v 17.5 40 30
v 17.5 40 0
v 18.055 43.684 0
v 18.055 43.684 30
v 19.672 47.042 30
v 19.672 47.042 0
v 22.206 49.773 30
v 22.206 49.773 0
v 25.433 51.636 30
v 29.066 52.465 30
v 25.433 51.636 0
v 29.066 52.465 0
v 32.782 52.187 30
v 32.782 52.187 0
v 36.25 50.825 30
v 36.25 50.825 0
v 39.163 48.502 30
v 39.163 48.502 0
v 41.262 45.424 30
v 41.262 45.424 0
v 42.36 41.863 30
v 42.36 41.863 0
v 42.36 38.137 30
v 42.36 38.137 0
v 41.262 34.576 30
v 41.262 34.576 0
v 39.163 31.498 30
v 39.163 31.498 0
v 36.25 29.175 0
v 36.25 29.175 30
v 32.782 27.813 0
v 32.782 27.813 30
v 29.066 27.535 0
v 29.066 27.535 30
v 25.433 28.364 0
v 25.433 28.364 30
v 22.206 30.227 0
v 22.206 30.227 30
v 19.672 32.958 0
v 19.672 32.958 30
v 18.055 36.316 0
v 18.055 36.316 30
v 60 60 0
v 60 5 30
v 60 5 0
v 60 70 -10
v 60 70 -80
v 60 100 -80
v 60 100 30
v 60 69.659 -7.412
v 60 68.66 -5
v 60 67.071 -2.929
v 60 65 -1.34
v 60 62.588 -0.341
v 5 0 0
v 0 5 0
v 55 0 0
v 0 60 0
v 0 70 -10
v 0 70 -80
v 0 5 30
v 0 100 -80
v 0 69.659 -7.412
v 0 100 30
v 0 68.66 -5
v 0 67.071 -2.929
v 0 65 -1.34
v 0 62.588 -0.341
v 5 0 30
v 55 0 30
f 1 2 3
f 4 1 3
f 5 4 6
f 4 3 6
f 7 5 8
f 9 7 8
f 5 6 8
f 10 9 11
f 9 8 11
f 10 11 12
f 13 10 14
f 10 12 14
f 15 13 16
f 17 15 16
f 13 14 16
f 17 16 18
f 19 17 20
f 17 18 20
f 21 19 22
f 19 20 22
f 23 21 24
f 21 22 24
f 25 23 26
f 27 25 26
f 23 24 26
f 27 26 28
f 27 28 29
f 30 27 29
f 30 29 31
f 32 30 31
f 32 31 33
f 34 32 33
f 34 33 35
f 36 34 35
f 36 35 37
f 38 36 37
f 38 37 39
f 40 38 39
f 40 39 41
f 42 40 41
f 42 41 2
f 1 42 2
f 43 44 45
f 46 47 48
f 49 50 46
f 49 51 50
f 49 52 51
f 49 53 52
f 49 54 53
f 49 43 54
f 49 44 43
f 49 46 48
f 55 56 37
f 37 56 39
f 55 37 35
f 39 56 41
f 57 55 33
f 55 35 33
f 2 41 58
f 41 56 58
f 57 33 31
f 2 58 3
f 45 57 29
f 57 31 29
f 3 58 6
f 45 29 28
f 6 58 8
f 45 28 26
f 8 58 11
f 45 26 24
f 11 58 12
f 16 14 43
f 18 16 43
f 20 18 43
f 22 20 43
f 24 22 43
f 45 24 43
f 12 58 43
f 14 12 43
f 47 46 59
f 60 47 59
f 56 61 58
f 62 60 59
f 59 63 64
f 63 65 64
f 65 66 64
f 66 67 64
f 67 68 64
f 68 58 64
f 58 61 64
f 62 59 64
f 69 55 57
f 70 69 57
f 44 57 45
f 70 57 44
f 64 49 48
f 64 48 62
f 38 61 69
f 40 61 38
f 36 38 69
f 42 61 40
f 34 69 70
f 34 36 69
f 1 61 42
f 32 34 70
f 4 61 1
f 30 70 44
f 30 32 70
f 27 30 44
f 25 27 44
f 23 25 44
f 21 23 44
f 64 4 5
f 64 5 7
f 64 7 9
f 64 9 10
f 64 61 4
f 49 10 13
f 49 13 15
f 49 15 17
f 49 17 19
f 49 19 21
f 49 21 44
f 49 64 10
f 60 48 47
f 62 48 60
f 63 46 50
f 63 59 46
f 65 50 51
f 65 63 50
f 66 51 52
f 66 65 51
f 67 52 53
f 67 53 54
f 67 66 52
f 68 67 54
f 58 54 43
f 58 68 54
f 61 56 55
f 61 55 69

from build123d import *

# Parameters (mm, degrees)
SKICA1_W                 = 60
SKICA1_H                 = 100
P_IDAT_VYSUNUT_M1_DEPTH  = 30
SKICA2_W                 = 60
SKICA2_H                 = 30
P_IDAT_VYSUNUT_M2_DEPTH  = 80
SKICA3_R                 = 12.5
ODEBRAT_VYSUNUT_M1_DEPTH = 80
ZAOBLIT2_R               = 10
ZKOSEN_1_SIZE            = 5


with BuildPart() as part:
    # Skica1 → Přidat vysunutím1 (new body)
    with BuildSketch(Plane.XY):
        with Locations((30, 50)):
            Rectangle(SKICA1_W, SKICA1_H)
    extrude(amount=P_IDAT_VYSUNUT_M1_DEPTH)

    # Skica2 → Přidat vysunutím2 (add)
    with BuildSketch(Plane(origin=(0, 0, 0), x_dir=(-1, 0, 0), z_dir=(0, 0, -1))):
        with Locations((-30, 85)):
            Rectangle(SKICA2_W, SKICA2_H)
    extrude(amount=P_IDAT_VYSUNUT_M2_DEPTH)

    # Skica3 → Odebrat vysunutím1 (cut)
    with BuildSketch(Plane(origin=(0, 0, 0), x_dir=(-1, 0, 0), z_dir=(0, 0, -1))):
        with Locations((-30, 40)):
            Circle(SKICA3_R)
    extrude(amount=-ODEBRAT_VYSUNUT_M1_DEPTH, mode=Mode.SUBTRACT)

    # Zaoblit2
    zaoblit2_edges = [part.edges().sort_by_distance(p)[0] for p in [
        (30, 70, 0),
    ]]
    fillet(zaoblit2_edges, radius=ZAOBLIT2_R)

    # Zkosení1
    zkosen_1_edges = [part.edges().sort_by_distance(p)[0] for p in [
        (60, 0, 15),
        (0, 0, 15),
    ]]
    chamfer(zkosen_1_edges, length=ZKOSEN_1_SIZE)


solid = part.part
